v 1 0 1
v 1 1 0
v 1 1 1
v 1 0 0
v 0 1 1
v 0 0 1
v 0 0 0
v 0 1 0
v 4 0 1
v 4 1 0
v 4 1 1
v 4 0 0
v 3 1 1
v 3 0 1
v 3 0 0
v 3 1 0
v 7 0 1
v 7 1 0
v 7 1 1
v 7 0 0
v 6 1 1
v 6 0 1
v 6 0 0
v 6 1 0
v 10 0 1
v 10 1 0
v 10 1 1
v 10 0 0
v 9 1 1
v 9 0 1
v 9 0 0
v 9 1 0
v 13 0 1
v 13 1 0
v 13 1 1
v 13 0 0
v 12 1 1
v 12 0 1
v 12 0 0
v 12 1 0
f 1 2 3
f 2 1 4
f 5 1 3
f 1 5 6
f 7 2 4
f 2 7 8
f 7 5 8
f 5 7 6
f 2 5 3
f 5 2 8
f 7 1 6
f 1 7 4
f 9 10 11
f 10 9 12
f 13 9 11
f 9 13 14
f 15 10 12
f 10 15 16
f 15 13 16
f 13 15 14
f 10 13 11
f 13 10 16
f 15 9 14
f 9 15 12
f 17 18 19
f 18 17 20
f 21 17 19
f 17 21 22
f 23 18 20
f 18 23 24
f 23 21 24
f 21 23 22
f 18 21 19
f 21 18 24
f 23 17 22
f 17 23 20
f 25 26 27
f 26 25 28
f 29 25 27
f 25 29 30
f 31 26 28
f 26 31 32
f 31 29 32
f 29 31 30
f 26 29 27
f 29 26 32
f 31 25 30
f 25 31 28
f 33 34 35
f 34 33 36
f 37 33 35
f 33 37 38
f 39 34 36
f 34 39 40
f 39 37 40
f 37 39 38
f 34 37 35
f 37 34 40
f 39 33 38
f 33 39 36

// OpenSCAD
//Enter OpenSCAD code here.
module lineup(num, space)
 { for (i = [0 : num-1]) translate([ space*i, 0, 0 ]) cube(); } 

lineup(5, 3);

 echo("Version:",version());
